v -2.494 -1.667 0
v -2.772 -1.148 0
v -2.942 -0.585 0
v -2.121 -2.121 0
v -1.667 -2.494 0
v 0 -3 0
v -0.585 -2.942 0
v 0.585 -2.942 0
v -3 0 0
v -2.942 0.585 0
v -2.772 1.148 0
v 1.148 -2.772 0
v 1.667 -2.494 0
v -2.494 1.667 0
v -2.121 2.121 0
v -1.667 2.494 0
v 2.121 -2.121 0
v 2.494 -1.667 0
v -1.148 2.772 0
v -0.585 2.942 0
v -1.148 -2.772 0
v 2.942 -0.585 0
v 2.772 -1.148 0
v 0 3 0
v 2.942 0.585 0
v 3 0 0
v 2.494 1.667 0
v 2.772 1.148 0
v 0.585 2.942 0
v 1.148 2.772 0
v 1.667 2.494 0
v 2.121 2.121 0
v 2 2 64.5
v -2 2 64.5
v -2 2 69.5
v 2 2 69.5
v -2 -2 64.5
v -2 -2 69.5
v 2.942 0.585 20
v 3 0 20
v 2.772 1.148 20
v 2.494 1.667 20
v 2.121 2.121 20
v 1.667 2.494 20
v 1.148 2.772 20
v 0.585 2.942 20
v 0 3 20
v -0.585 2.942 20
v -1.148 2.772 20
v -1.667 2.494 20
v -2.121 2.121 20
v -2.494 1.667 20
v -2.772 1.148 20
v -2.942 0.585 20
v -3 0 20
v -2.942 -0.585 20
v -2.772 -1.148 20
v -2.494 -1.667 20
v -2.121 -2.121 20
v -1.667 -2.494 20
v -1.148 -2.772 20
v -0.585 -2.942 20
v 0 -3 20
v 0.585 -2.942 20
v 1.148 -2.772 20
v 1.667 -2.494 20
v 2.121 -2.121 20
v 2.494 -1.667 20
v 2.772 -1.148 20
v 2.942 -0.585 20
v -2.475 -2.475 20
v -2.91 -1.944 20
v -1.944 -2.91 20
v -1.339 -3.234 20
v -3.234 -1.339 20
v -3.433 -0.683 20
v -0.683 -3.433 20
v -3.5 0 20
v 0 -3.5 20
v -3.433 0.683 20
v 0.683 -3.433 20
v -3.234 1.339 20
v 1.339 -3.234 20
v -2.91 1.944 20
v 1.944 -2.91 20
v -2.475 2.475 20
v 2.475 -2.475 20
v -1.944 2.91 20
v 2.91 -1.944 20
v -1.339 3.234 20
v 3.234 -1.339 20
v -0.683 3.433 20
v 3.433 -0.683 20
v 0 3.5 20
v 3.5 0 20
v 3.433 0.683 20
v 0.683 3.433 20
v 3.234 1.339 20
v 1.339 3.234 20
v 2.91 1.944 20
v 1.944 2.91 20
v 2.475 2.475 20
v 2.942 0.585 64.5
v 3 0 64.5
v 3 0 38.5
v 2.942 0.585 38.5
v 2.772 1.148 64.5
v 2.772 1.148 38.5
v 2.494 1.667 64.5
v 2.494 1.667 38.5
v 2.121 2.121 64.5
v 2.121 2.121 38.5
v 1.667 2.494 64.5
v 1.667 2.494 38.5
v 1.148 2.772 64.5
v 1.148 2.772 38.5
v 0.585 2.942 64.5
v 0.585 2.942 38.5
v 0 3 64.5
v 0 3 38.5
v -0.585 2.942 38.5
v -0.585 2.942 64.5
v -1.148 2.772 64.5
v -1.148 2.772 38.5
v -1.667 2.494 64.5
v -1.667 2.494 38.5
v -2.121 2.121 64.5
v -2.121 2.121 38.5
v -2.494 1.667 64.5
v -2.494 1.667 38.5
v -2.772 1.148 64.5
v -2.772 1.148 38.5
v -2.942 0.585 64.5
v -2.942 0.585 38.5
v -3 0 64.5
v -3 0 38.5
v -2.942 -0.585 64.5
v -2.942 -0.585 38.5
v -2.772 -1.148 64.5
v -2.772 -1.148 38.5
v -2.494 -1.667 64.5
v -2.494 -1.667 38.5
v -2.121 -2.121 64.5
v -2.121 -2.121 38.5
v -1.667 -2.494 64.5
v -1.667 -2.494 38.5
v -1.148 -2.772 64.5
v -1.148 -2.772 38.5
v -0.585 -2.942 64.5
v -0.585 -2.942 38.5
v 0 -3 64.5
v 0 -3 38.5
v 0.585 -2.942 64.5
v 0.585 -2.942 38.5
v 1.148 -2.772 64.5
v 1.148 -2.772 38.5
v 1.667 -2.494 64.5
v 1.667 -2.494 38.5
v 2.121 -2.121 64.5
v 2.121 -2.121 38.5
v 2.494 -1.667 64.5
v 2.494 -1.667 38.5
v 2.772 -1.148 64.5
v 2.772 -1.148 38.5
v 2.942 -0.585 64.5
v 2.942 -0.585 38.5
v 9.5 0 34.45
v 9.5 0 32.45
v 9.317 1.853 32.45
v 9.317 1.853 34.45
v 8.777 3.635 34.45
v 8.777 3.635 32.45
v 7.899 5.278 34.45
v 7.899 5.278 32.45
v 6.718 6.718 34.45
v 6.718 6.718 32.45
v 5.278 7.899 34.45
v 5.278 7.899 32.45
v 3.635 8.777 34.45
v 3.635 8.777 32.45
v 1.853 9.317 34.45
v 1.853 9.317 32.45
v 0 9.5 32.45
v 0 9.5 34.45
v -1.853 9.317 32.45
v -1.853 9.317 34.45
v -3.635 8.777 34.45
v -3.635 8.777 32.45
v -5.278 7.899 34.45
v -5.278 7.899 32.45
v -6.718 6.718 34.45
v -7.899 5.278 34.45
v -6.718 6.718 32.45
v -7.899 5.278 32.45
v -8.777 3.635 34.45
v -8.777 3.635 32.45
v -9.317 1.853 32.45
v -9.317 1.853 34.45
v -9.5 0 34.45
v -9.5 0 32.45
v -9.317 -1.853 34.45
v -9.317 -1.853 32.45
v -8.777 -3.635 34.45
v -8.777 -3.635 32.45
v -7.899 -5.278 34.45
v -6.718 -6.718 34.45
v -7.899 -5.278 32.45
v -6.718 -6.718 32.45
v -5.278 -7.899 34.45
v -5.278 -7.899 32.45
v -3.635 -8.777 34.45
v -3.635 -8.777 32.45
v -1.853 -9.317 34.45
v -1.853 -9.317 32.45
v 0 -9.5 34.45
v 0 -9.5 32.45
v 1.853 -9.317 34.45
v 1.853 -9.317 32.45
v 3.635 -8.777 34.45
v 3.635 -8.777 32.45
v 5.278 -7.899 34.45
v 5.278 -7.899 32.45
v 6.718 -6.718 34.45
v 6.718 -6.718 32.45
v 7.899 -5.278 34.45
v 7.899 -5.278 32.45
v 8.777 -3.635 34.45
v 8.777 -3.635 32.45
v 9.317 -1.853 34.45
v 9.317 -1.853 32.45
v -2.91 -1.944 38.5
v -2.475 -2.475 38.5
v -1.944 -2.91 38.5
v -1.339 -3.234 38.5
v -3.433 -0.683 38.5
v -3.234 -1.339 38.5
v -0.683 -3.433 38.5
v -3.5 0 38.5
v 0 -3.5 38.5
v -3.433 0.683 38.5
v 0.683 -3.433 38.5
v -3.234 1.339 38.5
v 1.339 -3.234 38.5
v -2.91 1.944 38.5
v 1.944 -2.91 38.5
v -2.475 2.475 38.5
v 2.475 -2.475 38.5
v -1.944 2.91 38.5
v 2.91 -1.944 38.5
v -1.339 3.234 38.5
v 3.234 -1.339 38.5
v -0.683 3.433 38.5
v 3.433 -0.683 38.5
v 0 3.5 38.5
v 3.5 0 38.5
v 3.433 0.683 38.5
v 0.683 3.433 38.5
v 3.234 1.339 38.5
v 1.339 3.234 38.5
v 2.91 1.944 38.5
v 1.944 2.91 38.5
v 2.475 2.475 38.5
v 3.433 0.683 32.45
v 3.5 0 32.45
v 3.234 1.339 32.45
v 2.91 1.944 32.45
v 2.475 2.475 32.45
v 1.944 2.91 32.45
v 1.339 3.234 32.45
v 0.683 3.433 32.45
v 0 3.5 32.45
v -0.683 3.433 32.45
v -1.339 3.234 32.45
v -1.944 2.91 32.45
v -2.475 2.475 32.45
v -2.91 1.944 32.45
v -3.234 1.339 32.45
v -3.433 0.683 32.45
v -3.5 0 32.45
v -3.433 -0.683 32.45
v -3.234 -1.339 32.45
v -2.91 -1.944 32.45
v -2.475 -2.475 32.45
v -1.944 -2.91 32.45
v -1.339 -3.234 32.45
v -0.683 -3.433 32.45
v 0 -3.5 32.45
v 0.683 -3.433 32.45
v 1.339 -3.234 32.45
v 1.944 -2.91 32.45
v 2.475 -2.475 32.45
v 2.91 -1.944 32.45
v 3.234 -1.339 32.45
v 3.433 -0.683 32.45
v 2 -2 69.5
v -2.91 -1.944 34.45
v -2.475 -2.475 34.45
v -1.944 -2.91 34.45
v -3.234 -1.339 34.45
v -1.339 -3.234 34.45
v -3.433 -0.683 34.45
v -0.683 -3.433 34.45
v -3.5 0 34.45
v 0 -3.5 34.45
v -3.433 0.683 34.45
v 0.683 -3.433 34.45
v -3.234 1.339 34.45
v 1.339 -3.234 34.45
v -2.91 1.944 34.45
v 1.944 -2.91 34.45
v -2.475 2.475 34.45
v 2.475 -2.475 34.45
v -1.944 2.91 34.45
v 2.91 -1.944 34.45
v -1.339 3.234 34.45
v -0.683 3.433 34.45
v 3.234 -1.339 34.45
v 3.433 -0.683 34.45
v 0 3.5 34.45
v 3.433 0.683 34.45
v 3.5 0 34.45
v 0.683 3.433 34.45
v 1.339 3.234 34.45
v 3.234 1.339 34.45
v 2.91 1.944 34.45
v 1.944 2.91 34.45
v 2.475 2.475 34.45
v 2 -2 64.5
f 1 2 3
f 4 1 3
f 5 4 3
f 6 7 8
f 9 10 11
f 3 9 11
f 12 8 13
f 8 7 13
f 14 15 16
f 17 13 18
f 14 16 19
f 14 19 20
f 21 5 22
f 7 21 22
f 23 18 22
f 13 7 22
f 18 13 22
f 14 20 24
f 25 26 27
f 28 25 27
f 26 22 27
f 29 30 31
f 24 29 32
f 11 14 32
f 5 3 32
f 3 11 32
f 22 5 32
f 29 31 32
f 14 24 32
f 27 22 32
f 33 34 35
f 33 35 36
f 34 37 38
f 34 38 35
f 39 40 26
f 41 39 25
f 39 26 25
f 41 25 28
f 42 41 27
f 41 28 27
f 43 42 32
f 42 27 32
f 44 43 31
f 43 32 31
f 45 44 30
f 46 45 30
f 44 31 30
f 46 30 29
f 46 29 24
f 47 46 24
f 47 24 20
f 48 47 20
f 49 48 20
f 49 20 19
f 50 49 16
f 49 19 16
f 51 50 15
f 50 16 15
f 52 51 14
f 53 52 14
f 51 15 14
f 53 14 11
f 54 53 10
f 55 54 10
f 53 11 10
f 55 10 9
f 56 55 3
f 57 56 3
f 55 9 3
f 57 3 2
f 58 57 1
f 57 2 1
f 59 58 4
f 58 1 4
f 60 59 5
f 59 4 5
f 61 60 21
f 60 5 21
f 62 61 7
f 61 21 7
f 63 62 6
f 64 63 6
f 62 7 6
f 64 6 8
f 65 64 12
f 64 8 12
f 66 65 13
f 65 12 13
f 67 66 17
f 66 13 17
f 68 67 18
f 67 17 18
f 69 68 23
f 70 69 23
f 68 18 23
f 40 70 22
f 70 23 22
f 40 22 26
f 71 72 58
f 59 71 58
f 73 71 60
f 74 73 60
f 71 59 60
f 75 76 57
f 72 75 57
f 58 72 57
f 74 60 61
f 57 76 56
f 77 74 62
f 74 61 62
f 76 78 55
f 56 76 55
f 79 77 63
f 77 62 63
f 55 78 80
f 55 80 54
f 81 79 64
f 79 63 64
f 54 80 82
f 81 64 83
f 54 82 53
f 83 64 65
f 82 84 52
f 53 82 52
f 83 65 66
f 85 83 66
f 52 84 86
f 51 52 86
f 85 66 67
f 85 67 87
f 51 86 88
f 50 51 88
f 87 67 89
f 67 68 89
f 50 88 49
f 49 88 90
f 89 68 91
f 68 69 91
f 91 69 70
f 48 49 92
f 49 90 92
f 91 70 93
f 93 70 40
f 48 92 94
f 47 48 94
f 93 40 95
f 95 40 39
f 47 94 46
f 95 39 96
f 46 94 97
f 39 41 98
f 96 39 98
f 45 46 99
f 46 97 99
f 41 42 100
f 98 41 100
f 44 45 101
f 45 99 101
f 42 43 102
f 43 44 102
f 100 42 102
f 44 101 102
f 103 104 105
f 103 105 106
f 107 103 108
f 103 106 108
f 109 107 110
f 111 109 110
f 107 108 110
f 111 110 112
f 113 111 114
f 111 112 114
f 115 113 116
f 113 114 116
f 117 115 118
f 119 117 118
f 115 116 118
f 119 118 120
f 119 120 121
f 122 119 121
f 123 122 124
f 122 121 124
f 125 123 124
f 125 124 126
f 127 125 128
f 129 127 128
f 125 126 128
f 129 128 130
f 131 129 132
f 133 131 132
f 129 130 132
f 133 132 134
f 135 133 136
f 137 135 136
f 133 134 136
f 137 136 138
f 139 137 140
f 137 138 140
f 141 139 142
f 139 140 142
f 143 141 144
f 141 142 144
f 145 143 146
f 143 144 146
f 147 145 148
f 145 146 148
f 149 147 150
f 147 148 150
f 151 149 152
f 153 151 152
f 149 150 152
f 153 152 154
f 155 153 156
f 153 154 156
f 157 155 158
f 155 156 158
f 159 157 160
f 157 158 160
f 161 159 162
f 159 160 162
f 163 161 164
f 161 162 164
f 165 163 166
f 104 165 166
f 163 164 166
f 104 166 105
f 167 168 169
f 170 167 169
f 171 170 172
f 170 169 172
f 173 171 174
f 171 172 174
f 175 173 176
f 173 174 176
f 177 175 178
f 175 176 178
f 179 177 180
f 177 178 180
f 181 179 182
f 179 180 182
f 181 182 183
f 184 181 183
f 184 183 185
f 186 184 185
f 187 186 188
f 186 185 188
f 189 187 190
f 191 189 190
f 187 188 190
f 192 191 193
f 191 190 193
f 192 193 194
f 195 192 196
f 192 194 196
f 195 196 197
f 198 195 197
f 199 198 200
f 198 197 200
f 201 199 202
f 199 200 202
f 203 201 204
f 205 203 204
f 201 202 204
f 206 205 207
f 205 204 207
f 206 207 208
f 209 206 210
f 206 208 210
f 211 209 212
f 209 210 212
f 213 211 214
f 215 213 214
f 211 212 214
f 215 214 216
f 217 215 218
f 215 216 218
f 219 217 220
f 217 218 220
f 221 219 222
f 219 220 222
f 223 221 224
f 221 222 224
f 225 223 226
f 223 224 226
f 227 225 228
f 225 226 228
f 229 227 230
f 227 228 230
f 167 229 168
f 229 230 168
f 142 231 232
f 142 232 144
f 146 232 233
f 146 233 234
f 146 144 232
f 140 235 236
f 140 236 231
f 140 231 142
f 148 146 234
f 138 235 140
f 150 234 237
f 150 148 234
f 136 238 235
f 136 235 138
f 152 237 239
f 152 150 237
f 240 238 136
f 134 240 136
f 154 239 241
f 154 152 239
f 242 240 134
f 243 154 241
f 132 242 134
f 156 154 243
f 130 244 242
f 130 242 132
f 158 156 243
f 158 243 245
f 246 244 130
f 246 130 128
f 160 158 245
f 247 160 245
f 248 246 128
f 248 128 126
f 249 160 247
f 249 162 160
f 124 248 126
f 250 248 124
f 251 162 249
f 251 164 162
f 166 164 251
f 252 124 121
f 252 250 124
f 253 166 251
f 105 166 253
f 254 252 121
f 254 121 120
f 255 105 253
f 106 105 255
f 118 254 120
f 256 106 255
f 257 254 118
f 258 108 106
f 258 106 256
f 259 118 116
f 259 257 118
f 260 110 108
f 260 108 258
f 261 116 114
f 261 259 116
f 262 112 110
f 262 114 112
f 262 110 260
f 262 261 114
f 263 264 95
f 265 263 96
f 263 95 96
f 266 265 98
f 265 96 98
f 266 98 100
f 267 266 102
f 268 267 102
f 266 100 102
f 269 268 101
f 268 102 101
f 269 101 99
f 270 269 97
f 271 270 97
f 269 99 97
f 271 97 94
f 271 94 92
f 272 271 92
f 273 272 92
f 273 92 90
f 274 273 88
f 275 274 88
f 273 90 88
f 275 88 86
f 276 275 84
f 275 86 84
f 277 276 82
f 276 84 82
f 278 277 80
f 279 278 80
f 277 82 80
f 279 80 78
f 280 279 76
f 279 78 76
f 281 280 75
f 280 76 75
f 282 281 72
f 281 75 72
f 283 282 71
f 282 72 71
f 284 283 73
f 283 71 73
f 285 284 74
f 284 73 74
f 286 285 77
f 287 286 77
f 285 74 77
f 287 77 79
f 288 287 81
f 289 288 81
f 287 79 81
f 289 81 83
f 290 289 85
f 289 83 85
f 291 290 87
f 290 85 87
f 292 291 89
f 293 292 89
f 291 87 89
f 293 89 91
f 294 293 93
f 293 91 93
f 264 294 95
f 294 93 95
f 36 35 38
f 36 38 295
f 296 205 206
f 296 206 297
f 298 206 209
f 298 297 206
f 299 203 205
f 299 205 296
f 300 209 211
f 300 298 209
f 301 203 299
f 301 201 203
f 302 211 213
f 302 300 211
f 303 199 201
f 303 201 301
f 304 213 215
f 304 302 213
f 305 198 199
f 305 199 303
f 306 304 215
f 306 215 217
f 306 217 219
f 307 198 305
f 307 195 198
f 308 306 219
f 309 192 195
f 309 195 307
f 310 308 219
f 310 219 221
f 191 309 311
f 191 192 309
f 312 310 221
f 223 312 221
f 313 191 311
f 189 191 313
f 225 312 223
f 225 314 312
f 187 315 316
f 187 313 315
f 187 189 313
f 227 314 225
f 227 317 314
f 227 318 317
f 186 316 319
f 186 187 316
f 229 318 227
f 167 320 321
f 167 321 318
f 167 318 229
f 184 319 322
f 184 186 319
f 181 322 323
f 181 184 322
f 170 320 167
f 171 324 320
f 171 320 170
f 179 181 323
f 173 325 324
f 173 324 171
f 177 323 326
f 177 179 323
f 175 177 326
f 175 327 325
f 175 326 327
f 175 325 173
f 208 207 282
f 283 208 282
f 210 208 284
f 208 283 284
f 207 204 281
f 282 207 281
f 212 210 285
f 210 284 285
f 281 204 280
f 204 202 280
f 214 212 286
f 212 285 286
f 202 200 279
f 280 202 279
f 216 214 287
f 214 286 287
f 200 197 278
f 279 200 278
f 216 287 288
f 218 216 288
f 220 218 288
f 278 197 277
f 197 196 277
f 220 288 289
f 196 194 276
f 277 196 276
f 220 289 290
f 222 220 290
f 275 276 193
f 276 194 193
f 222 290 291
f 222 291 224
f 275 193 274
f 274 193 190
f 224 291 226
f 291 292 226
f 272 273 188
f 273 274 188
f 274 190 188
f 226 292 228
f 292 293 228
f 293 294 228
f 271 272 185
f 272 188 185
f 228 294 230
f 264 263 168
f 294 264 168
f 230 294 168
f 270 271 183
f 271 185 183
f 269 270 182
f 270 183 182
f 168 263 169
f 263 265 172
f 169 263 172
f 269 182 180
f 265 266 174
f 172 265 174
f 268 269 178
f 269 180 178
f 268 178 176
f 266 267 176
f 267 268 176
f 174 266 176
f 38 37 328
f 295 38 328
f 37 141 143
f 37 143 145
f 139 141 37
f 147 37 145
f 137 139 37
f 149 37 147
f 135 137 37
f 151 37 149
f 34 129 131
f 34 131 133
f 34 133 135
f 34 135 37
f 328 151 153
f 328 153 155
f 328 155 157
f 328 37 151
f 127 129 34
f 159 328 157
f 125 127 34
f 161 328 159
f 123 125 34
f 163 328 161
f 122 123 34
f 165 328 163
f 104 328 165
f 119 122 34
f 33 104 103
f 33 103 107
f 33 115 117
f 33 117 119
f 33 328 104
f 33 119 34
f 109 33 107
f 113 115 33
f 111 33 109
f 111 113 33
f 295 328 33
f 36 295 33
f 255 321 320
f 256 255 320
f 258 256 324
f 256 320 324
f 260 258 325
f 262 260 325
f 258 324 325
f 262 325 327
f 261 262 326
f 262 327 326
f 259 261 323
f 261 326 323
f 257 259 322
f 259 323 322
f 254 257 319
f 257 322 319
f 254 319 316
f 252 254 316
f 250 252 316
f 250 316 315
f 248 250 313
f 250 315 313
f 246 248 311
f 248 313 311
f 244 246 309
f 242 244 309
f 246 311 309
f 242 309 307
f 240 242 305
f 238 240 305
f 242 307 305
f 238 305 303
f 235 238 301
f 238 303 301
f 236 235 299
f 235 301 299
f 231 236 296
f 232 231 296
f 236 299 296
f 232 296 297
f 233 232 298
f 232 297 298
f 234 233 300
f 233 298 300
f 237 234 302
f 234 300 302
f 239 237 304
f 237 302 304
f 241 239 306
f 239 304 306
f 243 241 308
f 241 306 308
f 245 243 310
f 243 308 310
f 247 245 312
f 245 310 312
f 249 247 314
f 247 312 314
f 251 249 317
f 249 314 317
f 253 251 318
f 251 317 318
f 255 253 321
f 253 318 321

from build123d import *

# Parameters (mm, degrees)
CROQUIS1_R              = 3
SALIENTE_EXTRUIR1_DEPTH = 20
CROQUIS2_R              = 3.5
SALIENTE_EXTRUIR2_DEPTH = 12.45
CROQUIS3_R              = 9.5
SALIENTE_EXTRUIR3_DEPTH = 2
CROQUIS4_R              = 3.5
SALIENTE_EXTRUIR4_DEPTH = 4.05
CROQUIS5_R              = 3
SALIENTE_EXTRUIR5_DEPTH = 26
CROQUIS6_W              = 4
CROQUIS6_H              = 4
SALIENTE_EXTRUIR6_DEPTH = 5


with BuildPart() as part:
    # Croquis1 → Saliente-Extruir1 (new body)
    with BuildSketch(Plane.XY):
        Circle(CROQUIS1_R)
    extrude(amount=SALIENTE_EXTRUIR1_DEPTH)

    # Croquis2 → Saliente-Extruir2 (add)
    with BuildSketch(Plane.XY.offset(20)):
        Circle(CROQUIS2_R)
    extrude(amount=SALIENTE_EXTRUIR2_DEPTH)

    # Croquis3 → Saliente-Extruir3 (add)
    with BuildSketch(Plane.XY.offset(32.45)):
        Circle(CROQUIS3_R)
    extrude(amount=SALIENTE_EXTRUIR3_DEPTH)

    # Croquis4 → Saliente-Extruir4 (add)
    with BuildSketch(Plane.XY.offset(34.45)):
        Circle(CROQUIS4_R)
    extrude(amount=SALIENTE_EXTRUIR4_DEPTH)

    # Croquis5 → Saliente-Extruir5 (add)
    with BuildSketch(Plane.XY.offset(38.5)):
        Circle(CROQUIS5_R)
    extrude(amount=SALIENTE_EXTRUIR5_DEPTH)

    # Croquis6 → Saliente-Extruir6 (add)
    with BuildSketch(Plane.XY.offset(64.5)):
        Rectangle(CROQUIS6_W, CROQUIS6_H)
    extrude(amount=SALIENTE_EXTRUIR6_DEPTH)


solid = part.part
